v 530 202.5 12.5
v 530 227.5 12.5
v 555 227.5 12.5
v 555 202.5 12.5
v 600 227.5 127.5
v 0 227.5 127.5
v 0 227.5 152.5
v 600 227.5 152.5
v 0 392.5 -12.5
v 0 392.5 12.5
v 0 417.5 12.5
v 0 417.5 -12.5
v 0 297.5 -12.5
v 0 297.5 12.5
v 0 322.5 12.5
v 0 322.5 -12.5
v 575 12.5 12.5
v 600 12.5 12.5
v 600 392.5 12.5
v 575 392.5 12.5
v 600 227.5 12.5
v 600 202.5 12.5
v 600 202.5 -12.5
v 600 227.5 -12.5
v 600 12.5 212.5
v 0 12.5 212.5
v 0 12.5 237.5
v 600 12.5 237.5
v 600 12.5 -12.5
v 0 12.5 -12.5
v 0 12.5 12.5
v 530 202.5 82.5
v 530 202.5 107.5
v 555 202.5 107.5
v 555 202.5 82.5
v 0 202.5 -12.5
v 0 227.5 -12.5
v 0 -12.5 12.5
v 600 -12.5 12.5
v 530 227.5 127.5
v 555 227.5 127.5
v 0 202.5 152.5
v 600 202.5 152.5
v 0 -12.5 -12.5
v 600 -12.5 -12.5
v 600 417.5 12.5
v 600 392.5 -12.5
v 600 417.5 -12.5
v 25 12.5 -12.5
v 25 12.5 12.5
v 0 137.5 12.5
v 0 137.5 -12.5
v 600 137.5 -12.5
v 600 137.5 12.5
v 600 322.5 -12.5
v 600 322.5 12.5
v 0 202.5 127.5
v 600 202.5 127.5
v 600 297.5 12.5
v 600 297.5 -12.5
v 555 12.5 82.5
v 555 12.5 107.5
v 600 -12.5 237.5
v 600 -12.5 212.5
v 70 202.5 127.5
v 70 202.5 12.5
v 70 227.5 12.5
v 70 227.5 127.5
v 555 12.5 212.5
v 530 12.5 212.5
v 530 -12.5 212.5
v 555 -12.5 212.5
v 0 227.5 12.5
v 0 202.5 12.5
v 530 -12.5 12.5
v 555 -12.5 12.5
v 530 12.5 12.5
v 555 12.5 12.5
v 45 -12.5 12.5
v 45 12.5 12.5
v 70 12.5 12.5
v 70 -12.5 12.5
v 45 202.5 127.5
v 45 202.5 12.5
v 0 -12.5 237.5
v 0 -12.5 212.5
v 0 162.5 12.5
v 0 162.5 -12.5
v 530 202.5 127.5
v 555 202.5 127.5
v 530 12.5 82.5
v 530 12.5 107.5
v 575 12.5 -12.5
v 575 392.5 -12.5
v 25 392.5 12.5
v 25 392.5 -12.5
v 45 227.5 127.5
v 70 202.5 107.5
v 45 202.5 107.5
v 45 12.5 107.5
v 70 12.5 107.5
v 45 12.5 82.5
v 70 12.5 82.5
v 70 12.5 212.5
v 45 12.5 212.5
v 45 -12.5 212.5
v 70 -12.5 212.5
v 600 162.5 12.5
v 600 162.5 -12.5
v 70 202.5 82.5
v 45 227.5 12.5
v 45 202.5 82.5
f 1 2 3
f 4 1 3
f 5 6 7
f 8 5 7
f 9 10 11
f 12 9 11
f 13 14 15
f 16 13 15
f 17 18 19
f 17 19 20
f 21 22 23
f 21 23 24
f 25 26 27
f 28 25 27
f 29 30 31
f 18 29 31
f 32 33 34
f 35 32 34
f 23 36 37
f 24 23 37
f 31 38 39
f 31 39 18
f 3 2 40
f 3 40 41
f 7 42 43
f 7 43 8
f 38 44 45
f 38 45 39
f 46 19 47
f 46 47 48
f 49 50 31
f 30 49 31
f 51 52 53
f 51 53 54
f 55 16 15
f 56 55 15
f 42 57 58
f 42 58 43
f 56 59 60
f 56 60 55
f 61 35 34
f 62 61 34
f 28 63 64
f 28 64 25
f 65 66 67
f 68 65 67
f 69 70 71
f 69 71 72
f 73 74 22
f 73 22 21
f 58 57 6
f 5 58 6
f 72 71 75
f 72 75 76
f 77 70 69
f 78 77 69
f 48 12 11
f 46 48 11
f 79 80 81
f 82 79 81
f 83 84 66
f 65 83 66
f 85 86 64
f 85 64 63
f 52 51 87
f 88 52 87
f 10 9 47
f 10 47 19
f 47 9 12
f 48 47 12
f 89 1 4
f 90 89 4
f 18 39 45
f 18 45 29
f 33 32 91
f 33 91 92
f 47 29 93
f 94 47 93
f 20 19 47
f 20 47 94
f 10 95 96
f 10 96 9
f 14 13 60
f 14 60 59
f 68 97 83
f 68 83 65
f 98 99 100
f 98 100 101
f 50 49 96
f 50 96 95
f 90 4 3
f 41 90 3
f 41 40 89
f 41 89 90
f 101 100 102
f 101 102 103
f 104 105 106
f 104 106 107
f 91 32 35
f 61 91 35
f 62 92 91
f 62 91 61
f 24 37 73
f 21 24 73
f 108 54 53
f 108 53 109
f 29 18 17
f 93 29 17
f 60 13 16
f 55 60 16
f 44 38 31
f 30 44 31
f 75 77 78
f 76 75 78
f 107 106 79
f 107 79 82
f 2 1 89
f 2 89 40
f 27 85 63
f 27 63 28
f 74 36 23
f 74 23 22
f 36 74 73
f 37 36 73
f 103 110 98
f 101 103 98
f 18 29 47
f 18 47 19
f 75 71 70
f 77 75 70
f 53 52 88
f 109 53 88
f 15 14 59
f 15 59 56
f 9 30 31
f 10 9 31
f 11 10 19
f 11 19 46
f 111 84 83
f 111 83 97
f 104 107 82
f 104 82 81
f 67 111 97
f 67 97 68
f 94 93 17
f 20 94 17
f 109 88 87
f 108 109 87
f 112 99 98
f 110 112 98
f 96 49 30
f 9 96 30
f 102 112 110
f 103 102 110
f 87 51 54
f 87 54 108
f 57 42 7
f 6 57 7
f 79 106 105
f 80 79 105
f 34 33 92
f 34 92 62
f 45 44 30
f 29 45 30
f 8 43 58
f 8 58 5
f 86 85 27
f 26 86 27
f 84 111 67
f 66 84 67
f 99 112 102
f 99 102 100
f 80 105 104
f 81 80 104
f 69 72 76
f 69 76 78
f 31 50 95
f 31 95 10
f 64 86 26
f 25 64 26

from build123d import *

# Parameters (mm, degrees)
F0_W     = 25
F0_H     = 25
F1_DEPTH = 600
F2_W     = 25
F2_H     = 25
F3_DEPTH = 380
F4_W     = 25
F4_H     = 25
F5_DEPTH = 115
F6_W     = 25
F6_H     = 25
F7_DEPTH = 200
F8_W     = 25
F8_H     = 25
F9_DEPTH = 190


with BuildPart() as f1:
    # F0 (on Right) → F1 (new body)
    with BuildSketch(Plane.YZ):
        Rectangle(F0_W, F0_H)
    extrude(amount=F1_DEPTH)


with BuildPart() as f1b:
    # F0 (on Right) → F1, piece 2 (new body)
    with BuildSketch(Plane.YZ):
        with Locations((405, 0)):
            Rectangle(F0_W, F0_H)
    extrude(amount=F1_DEPTH)


with BuildPart() as f1c:
    # F0 (on Right) → F1, piece 3 (new body)
    with BuildSketch(Plane.YZ):
        with Locations((150, 0)):
            Rectangle(F0_W, F0_H)
    extrude(amount=F1_DEPTH)


with BuildPart() as f1d:
    # F0 (on Right) → F1, piece 4 (new body)
    with BuildSketch(Plane.YZ):
        with Locations((215, 0)):
            Rectangle(F0_W, F0_H)
    extrude(amount=F1_DEPTH)


with BuildPart() as f1e:
    # F0 (on Right) → F1, piece 5 (new body)
    with BuildSketch(Plane.YZ):
        with Locations((0, 225)):
            Rectangle(F0_W, F0_H)
    extrude(amount=F1_DEPTH)


with BuildPart() as f1f:
    # F0 (on Right) → F1, piece 6 (new body)
    with BuildSketch(Plane.YZ):
        with Locations((215, 140)):
            Rectangle(F0_W, F0_H)
    extrude(amount=F1_DEPTH)


with BuildPart() as f1g:
    # F0 (on Right) → F1, piece 7 (new body)
    with BuildSketch(Plane.YZ):
        with Locations((310, 0)):
            Rectangle(F0_W, F0_H)
    extrude(amount=F1_DEPTH)


with BuildPart() as f3:
    # F2 (on face) → F3 (new body, through all)
    with BuildSketch(Plane(origin=(0, 12.5, 0), x_dir=(-1, 0, 0), z_dir=(0, 1, 0))):
        with Locations((-12.5, 0)):
            Rectangle(F2_W, F2_H)
    extrude(amount=F3_DEPTH)


with BuildPart() as f3b:
    # F2 (on face) → F3, piece 2 (new body, through all)
    with BuildSketch(Plane(origin=(0, 12.5, 0), x_dir=(-1, 0, 0), z_dir=(0, 1, 0))):
        with Locations((-587.5, 0)):
            Rectangle(F2_W, F2_H)
    extrude(amount=F3_DEPTH)


with BuildPart() as f5:
    # F4 (on face) → F5 (new body, through all)
    with BuildSketch(Plane.XY.offset(12.5)):
        with Locations((542.5, 215)):
            Rectangle(F4_W, F4_H)
    extrude(amount=F5_DEPTH)


with BuildPart() as f5b:
    # F4 (on face) → F5, piece 2 (new body, through all)
    with BuildSketch(Plane.XY.offset(12.5)):
        with Locations((57.5, 215)):
            Rectangle(F4_W, F4_H)
    extrude(amount=F5_DEPTH)


with BuildPart() as f7:
    # F6 (on face) → F7 (new body, through all)
    with BuildSketch(Plane.XY.offset(12.5)):
        with Locations((542.5, 0)):
            Rectangle(F6_W, F6_H)
    extrude(amount=F7_DEPTH)


with BuildPart() as f7b:
    # F6 (on face) → F7, piece 2 (new body, through all)
    with BuildSketch(Plane.XY.offset(12.5)):
        with Locations((57.5, 0)):
            Rectangle(F6_W, F6_H)
    extrude(amount=F7_DEPTH)


with BuildPart() as f9:
    # F8 (on face) → F9 (new body, through all)
    with BuildSketch(Plane.XZ.offset(-202.5)):
        with Locations((57.5, 95)):
            Rectangle(F8_W, F8_H)
    extrude(amount=F9_DEPTH)


with BuildPart() as f9b:
    # F8 (on face) → F9, piece 2 (new body, through all)
    with BuildSketch(Plane.XZ.offset(-202.5)):
        with Locations((542.5, 95)):
            Rectangle(F8_W, F8_H)
    extrude(amount=F9_DEPTH)


solid = Compound([f1.part, f1b.part, f1c.part, f1d.part, f1e.part, f1f.part, f1g.part, f3.part, f3b.part, f5.part, f5b.part, f7.part, f7b.part, f9.part, f9b.part])
